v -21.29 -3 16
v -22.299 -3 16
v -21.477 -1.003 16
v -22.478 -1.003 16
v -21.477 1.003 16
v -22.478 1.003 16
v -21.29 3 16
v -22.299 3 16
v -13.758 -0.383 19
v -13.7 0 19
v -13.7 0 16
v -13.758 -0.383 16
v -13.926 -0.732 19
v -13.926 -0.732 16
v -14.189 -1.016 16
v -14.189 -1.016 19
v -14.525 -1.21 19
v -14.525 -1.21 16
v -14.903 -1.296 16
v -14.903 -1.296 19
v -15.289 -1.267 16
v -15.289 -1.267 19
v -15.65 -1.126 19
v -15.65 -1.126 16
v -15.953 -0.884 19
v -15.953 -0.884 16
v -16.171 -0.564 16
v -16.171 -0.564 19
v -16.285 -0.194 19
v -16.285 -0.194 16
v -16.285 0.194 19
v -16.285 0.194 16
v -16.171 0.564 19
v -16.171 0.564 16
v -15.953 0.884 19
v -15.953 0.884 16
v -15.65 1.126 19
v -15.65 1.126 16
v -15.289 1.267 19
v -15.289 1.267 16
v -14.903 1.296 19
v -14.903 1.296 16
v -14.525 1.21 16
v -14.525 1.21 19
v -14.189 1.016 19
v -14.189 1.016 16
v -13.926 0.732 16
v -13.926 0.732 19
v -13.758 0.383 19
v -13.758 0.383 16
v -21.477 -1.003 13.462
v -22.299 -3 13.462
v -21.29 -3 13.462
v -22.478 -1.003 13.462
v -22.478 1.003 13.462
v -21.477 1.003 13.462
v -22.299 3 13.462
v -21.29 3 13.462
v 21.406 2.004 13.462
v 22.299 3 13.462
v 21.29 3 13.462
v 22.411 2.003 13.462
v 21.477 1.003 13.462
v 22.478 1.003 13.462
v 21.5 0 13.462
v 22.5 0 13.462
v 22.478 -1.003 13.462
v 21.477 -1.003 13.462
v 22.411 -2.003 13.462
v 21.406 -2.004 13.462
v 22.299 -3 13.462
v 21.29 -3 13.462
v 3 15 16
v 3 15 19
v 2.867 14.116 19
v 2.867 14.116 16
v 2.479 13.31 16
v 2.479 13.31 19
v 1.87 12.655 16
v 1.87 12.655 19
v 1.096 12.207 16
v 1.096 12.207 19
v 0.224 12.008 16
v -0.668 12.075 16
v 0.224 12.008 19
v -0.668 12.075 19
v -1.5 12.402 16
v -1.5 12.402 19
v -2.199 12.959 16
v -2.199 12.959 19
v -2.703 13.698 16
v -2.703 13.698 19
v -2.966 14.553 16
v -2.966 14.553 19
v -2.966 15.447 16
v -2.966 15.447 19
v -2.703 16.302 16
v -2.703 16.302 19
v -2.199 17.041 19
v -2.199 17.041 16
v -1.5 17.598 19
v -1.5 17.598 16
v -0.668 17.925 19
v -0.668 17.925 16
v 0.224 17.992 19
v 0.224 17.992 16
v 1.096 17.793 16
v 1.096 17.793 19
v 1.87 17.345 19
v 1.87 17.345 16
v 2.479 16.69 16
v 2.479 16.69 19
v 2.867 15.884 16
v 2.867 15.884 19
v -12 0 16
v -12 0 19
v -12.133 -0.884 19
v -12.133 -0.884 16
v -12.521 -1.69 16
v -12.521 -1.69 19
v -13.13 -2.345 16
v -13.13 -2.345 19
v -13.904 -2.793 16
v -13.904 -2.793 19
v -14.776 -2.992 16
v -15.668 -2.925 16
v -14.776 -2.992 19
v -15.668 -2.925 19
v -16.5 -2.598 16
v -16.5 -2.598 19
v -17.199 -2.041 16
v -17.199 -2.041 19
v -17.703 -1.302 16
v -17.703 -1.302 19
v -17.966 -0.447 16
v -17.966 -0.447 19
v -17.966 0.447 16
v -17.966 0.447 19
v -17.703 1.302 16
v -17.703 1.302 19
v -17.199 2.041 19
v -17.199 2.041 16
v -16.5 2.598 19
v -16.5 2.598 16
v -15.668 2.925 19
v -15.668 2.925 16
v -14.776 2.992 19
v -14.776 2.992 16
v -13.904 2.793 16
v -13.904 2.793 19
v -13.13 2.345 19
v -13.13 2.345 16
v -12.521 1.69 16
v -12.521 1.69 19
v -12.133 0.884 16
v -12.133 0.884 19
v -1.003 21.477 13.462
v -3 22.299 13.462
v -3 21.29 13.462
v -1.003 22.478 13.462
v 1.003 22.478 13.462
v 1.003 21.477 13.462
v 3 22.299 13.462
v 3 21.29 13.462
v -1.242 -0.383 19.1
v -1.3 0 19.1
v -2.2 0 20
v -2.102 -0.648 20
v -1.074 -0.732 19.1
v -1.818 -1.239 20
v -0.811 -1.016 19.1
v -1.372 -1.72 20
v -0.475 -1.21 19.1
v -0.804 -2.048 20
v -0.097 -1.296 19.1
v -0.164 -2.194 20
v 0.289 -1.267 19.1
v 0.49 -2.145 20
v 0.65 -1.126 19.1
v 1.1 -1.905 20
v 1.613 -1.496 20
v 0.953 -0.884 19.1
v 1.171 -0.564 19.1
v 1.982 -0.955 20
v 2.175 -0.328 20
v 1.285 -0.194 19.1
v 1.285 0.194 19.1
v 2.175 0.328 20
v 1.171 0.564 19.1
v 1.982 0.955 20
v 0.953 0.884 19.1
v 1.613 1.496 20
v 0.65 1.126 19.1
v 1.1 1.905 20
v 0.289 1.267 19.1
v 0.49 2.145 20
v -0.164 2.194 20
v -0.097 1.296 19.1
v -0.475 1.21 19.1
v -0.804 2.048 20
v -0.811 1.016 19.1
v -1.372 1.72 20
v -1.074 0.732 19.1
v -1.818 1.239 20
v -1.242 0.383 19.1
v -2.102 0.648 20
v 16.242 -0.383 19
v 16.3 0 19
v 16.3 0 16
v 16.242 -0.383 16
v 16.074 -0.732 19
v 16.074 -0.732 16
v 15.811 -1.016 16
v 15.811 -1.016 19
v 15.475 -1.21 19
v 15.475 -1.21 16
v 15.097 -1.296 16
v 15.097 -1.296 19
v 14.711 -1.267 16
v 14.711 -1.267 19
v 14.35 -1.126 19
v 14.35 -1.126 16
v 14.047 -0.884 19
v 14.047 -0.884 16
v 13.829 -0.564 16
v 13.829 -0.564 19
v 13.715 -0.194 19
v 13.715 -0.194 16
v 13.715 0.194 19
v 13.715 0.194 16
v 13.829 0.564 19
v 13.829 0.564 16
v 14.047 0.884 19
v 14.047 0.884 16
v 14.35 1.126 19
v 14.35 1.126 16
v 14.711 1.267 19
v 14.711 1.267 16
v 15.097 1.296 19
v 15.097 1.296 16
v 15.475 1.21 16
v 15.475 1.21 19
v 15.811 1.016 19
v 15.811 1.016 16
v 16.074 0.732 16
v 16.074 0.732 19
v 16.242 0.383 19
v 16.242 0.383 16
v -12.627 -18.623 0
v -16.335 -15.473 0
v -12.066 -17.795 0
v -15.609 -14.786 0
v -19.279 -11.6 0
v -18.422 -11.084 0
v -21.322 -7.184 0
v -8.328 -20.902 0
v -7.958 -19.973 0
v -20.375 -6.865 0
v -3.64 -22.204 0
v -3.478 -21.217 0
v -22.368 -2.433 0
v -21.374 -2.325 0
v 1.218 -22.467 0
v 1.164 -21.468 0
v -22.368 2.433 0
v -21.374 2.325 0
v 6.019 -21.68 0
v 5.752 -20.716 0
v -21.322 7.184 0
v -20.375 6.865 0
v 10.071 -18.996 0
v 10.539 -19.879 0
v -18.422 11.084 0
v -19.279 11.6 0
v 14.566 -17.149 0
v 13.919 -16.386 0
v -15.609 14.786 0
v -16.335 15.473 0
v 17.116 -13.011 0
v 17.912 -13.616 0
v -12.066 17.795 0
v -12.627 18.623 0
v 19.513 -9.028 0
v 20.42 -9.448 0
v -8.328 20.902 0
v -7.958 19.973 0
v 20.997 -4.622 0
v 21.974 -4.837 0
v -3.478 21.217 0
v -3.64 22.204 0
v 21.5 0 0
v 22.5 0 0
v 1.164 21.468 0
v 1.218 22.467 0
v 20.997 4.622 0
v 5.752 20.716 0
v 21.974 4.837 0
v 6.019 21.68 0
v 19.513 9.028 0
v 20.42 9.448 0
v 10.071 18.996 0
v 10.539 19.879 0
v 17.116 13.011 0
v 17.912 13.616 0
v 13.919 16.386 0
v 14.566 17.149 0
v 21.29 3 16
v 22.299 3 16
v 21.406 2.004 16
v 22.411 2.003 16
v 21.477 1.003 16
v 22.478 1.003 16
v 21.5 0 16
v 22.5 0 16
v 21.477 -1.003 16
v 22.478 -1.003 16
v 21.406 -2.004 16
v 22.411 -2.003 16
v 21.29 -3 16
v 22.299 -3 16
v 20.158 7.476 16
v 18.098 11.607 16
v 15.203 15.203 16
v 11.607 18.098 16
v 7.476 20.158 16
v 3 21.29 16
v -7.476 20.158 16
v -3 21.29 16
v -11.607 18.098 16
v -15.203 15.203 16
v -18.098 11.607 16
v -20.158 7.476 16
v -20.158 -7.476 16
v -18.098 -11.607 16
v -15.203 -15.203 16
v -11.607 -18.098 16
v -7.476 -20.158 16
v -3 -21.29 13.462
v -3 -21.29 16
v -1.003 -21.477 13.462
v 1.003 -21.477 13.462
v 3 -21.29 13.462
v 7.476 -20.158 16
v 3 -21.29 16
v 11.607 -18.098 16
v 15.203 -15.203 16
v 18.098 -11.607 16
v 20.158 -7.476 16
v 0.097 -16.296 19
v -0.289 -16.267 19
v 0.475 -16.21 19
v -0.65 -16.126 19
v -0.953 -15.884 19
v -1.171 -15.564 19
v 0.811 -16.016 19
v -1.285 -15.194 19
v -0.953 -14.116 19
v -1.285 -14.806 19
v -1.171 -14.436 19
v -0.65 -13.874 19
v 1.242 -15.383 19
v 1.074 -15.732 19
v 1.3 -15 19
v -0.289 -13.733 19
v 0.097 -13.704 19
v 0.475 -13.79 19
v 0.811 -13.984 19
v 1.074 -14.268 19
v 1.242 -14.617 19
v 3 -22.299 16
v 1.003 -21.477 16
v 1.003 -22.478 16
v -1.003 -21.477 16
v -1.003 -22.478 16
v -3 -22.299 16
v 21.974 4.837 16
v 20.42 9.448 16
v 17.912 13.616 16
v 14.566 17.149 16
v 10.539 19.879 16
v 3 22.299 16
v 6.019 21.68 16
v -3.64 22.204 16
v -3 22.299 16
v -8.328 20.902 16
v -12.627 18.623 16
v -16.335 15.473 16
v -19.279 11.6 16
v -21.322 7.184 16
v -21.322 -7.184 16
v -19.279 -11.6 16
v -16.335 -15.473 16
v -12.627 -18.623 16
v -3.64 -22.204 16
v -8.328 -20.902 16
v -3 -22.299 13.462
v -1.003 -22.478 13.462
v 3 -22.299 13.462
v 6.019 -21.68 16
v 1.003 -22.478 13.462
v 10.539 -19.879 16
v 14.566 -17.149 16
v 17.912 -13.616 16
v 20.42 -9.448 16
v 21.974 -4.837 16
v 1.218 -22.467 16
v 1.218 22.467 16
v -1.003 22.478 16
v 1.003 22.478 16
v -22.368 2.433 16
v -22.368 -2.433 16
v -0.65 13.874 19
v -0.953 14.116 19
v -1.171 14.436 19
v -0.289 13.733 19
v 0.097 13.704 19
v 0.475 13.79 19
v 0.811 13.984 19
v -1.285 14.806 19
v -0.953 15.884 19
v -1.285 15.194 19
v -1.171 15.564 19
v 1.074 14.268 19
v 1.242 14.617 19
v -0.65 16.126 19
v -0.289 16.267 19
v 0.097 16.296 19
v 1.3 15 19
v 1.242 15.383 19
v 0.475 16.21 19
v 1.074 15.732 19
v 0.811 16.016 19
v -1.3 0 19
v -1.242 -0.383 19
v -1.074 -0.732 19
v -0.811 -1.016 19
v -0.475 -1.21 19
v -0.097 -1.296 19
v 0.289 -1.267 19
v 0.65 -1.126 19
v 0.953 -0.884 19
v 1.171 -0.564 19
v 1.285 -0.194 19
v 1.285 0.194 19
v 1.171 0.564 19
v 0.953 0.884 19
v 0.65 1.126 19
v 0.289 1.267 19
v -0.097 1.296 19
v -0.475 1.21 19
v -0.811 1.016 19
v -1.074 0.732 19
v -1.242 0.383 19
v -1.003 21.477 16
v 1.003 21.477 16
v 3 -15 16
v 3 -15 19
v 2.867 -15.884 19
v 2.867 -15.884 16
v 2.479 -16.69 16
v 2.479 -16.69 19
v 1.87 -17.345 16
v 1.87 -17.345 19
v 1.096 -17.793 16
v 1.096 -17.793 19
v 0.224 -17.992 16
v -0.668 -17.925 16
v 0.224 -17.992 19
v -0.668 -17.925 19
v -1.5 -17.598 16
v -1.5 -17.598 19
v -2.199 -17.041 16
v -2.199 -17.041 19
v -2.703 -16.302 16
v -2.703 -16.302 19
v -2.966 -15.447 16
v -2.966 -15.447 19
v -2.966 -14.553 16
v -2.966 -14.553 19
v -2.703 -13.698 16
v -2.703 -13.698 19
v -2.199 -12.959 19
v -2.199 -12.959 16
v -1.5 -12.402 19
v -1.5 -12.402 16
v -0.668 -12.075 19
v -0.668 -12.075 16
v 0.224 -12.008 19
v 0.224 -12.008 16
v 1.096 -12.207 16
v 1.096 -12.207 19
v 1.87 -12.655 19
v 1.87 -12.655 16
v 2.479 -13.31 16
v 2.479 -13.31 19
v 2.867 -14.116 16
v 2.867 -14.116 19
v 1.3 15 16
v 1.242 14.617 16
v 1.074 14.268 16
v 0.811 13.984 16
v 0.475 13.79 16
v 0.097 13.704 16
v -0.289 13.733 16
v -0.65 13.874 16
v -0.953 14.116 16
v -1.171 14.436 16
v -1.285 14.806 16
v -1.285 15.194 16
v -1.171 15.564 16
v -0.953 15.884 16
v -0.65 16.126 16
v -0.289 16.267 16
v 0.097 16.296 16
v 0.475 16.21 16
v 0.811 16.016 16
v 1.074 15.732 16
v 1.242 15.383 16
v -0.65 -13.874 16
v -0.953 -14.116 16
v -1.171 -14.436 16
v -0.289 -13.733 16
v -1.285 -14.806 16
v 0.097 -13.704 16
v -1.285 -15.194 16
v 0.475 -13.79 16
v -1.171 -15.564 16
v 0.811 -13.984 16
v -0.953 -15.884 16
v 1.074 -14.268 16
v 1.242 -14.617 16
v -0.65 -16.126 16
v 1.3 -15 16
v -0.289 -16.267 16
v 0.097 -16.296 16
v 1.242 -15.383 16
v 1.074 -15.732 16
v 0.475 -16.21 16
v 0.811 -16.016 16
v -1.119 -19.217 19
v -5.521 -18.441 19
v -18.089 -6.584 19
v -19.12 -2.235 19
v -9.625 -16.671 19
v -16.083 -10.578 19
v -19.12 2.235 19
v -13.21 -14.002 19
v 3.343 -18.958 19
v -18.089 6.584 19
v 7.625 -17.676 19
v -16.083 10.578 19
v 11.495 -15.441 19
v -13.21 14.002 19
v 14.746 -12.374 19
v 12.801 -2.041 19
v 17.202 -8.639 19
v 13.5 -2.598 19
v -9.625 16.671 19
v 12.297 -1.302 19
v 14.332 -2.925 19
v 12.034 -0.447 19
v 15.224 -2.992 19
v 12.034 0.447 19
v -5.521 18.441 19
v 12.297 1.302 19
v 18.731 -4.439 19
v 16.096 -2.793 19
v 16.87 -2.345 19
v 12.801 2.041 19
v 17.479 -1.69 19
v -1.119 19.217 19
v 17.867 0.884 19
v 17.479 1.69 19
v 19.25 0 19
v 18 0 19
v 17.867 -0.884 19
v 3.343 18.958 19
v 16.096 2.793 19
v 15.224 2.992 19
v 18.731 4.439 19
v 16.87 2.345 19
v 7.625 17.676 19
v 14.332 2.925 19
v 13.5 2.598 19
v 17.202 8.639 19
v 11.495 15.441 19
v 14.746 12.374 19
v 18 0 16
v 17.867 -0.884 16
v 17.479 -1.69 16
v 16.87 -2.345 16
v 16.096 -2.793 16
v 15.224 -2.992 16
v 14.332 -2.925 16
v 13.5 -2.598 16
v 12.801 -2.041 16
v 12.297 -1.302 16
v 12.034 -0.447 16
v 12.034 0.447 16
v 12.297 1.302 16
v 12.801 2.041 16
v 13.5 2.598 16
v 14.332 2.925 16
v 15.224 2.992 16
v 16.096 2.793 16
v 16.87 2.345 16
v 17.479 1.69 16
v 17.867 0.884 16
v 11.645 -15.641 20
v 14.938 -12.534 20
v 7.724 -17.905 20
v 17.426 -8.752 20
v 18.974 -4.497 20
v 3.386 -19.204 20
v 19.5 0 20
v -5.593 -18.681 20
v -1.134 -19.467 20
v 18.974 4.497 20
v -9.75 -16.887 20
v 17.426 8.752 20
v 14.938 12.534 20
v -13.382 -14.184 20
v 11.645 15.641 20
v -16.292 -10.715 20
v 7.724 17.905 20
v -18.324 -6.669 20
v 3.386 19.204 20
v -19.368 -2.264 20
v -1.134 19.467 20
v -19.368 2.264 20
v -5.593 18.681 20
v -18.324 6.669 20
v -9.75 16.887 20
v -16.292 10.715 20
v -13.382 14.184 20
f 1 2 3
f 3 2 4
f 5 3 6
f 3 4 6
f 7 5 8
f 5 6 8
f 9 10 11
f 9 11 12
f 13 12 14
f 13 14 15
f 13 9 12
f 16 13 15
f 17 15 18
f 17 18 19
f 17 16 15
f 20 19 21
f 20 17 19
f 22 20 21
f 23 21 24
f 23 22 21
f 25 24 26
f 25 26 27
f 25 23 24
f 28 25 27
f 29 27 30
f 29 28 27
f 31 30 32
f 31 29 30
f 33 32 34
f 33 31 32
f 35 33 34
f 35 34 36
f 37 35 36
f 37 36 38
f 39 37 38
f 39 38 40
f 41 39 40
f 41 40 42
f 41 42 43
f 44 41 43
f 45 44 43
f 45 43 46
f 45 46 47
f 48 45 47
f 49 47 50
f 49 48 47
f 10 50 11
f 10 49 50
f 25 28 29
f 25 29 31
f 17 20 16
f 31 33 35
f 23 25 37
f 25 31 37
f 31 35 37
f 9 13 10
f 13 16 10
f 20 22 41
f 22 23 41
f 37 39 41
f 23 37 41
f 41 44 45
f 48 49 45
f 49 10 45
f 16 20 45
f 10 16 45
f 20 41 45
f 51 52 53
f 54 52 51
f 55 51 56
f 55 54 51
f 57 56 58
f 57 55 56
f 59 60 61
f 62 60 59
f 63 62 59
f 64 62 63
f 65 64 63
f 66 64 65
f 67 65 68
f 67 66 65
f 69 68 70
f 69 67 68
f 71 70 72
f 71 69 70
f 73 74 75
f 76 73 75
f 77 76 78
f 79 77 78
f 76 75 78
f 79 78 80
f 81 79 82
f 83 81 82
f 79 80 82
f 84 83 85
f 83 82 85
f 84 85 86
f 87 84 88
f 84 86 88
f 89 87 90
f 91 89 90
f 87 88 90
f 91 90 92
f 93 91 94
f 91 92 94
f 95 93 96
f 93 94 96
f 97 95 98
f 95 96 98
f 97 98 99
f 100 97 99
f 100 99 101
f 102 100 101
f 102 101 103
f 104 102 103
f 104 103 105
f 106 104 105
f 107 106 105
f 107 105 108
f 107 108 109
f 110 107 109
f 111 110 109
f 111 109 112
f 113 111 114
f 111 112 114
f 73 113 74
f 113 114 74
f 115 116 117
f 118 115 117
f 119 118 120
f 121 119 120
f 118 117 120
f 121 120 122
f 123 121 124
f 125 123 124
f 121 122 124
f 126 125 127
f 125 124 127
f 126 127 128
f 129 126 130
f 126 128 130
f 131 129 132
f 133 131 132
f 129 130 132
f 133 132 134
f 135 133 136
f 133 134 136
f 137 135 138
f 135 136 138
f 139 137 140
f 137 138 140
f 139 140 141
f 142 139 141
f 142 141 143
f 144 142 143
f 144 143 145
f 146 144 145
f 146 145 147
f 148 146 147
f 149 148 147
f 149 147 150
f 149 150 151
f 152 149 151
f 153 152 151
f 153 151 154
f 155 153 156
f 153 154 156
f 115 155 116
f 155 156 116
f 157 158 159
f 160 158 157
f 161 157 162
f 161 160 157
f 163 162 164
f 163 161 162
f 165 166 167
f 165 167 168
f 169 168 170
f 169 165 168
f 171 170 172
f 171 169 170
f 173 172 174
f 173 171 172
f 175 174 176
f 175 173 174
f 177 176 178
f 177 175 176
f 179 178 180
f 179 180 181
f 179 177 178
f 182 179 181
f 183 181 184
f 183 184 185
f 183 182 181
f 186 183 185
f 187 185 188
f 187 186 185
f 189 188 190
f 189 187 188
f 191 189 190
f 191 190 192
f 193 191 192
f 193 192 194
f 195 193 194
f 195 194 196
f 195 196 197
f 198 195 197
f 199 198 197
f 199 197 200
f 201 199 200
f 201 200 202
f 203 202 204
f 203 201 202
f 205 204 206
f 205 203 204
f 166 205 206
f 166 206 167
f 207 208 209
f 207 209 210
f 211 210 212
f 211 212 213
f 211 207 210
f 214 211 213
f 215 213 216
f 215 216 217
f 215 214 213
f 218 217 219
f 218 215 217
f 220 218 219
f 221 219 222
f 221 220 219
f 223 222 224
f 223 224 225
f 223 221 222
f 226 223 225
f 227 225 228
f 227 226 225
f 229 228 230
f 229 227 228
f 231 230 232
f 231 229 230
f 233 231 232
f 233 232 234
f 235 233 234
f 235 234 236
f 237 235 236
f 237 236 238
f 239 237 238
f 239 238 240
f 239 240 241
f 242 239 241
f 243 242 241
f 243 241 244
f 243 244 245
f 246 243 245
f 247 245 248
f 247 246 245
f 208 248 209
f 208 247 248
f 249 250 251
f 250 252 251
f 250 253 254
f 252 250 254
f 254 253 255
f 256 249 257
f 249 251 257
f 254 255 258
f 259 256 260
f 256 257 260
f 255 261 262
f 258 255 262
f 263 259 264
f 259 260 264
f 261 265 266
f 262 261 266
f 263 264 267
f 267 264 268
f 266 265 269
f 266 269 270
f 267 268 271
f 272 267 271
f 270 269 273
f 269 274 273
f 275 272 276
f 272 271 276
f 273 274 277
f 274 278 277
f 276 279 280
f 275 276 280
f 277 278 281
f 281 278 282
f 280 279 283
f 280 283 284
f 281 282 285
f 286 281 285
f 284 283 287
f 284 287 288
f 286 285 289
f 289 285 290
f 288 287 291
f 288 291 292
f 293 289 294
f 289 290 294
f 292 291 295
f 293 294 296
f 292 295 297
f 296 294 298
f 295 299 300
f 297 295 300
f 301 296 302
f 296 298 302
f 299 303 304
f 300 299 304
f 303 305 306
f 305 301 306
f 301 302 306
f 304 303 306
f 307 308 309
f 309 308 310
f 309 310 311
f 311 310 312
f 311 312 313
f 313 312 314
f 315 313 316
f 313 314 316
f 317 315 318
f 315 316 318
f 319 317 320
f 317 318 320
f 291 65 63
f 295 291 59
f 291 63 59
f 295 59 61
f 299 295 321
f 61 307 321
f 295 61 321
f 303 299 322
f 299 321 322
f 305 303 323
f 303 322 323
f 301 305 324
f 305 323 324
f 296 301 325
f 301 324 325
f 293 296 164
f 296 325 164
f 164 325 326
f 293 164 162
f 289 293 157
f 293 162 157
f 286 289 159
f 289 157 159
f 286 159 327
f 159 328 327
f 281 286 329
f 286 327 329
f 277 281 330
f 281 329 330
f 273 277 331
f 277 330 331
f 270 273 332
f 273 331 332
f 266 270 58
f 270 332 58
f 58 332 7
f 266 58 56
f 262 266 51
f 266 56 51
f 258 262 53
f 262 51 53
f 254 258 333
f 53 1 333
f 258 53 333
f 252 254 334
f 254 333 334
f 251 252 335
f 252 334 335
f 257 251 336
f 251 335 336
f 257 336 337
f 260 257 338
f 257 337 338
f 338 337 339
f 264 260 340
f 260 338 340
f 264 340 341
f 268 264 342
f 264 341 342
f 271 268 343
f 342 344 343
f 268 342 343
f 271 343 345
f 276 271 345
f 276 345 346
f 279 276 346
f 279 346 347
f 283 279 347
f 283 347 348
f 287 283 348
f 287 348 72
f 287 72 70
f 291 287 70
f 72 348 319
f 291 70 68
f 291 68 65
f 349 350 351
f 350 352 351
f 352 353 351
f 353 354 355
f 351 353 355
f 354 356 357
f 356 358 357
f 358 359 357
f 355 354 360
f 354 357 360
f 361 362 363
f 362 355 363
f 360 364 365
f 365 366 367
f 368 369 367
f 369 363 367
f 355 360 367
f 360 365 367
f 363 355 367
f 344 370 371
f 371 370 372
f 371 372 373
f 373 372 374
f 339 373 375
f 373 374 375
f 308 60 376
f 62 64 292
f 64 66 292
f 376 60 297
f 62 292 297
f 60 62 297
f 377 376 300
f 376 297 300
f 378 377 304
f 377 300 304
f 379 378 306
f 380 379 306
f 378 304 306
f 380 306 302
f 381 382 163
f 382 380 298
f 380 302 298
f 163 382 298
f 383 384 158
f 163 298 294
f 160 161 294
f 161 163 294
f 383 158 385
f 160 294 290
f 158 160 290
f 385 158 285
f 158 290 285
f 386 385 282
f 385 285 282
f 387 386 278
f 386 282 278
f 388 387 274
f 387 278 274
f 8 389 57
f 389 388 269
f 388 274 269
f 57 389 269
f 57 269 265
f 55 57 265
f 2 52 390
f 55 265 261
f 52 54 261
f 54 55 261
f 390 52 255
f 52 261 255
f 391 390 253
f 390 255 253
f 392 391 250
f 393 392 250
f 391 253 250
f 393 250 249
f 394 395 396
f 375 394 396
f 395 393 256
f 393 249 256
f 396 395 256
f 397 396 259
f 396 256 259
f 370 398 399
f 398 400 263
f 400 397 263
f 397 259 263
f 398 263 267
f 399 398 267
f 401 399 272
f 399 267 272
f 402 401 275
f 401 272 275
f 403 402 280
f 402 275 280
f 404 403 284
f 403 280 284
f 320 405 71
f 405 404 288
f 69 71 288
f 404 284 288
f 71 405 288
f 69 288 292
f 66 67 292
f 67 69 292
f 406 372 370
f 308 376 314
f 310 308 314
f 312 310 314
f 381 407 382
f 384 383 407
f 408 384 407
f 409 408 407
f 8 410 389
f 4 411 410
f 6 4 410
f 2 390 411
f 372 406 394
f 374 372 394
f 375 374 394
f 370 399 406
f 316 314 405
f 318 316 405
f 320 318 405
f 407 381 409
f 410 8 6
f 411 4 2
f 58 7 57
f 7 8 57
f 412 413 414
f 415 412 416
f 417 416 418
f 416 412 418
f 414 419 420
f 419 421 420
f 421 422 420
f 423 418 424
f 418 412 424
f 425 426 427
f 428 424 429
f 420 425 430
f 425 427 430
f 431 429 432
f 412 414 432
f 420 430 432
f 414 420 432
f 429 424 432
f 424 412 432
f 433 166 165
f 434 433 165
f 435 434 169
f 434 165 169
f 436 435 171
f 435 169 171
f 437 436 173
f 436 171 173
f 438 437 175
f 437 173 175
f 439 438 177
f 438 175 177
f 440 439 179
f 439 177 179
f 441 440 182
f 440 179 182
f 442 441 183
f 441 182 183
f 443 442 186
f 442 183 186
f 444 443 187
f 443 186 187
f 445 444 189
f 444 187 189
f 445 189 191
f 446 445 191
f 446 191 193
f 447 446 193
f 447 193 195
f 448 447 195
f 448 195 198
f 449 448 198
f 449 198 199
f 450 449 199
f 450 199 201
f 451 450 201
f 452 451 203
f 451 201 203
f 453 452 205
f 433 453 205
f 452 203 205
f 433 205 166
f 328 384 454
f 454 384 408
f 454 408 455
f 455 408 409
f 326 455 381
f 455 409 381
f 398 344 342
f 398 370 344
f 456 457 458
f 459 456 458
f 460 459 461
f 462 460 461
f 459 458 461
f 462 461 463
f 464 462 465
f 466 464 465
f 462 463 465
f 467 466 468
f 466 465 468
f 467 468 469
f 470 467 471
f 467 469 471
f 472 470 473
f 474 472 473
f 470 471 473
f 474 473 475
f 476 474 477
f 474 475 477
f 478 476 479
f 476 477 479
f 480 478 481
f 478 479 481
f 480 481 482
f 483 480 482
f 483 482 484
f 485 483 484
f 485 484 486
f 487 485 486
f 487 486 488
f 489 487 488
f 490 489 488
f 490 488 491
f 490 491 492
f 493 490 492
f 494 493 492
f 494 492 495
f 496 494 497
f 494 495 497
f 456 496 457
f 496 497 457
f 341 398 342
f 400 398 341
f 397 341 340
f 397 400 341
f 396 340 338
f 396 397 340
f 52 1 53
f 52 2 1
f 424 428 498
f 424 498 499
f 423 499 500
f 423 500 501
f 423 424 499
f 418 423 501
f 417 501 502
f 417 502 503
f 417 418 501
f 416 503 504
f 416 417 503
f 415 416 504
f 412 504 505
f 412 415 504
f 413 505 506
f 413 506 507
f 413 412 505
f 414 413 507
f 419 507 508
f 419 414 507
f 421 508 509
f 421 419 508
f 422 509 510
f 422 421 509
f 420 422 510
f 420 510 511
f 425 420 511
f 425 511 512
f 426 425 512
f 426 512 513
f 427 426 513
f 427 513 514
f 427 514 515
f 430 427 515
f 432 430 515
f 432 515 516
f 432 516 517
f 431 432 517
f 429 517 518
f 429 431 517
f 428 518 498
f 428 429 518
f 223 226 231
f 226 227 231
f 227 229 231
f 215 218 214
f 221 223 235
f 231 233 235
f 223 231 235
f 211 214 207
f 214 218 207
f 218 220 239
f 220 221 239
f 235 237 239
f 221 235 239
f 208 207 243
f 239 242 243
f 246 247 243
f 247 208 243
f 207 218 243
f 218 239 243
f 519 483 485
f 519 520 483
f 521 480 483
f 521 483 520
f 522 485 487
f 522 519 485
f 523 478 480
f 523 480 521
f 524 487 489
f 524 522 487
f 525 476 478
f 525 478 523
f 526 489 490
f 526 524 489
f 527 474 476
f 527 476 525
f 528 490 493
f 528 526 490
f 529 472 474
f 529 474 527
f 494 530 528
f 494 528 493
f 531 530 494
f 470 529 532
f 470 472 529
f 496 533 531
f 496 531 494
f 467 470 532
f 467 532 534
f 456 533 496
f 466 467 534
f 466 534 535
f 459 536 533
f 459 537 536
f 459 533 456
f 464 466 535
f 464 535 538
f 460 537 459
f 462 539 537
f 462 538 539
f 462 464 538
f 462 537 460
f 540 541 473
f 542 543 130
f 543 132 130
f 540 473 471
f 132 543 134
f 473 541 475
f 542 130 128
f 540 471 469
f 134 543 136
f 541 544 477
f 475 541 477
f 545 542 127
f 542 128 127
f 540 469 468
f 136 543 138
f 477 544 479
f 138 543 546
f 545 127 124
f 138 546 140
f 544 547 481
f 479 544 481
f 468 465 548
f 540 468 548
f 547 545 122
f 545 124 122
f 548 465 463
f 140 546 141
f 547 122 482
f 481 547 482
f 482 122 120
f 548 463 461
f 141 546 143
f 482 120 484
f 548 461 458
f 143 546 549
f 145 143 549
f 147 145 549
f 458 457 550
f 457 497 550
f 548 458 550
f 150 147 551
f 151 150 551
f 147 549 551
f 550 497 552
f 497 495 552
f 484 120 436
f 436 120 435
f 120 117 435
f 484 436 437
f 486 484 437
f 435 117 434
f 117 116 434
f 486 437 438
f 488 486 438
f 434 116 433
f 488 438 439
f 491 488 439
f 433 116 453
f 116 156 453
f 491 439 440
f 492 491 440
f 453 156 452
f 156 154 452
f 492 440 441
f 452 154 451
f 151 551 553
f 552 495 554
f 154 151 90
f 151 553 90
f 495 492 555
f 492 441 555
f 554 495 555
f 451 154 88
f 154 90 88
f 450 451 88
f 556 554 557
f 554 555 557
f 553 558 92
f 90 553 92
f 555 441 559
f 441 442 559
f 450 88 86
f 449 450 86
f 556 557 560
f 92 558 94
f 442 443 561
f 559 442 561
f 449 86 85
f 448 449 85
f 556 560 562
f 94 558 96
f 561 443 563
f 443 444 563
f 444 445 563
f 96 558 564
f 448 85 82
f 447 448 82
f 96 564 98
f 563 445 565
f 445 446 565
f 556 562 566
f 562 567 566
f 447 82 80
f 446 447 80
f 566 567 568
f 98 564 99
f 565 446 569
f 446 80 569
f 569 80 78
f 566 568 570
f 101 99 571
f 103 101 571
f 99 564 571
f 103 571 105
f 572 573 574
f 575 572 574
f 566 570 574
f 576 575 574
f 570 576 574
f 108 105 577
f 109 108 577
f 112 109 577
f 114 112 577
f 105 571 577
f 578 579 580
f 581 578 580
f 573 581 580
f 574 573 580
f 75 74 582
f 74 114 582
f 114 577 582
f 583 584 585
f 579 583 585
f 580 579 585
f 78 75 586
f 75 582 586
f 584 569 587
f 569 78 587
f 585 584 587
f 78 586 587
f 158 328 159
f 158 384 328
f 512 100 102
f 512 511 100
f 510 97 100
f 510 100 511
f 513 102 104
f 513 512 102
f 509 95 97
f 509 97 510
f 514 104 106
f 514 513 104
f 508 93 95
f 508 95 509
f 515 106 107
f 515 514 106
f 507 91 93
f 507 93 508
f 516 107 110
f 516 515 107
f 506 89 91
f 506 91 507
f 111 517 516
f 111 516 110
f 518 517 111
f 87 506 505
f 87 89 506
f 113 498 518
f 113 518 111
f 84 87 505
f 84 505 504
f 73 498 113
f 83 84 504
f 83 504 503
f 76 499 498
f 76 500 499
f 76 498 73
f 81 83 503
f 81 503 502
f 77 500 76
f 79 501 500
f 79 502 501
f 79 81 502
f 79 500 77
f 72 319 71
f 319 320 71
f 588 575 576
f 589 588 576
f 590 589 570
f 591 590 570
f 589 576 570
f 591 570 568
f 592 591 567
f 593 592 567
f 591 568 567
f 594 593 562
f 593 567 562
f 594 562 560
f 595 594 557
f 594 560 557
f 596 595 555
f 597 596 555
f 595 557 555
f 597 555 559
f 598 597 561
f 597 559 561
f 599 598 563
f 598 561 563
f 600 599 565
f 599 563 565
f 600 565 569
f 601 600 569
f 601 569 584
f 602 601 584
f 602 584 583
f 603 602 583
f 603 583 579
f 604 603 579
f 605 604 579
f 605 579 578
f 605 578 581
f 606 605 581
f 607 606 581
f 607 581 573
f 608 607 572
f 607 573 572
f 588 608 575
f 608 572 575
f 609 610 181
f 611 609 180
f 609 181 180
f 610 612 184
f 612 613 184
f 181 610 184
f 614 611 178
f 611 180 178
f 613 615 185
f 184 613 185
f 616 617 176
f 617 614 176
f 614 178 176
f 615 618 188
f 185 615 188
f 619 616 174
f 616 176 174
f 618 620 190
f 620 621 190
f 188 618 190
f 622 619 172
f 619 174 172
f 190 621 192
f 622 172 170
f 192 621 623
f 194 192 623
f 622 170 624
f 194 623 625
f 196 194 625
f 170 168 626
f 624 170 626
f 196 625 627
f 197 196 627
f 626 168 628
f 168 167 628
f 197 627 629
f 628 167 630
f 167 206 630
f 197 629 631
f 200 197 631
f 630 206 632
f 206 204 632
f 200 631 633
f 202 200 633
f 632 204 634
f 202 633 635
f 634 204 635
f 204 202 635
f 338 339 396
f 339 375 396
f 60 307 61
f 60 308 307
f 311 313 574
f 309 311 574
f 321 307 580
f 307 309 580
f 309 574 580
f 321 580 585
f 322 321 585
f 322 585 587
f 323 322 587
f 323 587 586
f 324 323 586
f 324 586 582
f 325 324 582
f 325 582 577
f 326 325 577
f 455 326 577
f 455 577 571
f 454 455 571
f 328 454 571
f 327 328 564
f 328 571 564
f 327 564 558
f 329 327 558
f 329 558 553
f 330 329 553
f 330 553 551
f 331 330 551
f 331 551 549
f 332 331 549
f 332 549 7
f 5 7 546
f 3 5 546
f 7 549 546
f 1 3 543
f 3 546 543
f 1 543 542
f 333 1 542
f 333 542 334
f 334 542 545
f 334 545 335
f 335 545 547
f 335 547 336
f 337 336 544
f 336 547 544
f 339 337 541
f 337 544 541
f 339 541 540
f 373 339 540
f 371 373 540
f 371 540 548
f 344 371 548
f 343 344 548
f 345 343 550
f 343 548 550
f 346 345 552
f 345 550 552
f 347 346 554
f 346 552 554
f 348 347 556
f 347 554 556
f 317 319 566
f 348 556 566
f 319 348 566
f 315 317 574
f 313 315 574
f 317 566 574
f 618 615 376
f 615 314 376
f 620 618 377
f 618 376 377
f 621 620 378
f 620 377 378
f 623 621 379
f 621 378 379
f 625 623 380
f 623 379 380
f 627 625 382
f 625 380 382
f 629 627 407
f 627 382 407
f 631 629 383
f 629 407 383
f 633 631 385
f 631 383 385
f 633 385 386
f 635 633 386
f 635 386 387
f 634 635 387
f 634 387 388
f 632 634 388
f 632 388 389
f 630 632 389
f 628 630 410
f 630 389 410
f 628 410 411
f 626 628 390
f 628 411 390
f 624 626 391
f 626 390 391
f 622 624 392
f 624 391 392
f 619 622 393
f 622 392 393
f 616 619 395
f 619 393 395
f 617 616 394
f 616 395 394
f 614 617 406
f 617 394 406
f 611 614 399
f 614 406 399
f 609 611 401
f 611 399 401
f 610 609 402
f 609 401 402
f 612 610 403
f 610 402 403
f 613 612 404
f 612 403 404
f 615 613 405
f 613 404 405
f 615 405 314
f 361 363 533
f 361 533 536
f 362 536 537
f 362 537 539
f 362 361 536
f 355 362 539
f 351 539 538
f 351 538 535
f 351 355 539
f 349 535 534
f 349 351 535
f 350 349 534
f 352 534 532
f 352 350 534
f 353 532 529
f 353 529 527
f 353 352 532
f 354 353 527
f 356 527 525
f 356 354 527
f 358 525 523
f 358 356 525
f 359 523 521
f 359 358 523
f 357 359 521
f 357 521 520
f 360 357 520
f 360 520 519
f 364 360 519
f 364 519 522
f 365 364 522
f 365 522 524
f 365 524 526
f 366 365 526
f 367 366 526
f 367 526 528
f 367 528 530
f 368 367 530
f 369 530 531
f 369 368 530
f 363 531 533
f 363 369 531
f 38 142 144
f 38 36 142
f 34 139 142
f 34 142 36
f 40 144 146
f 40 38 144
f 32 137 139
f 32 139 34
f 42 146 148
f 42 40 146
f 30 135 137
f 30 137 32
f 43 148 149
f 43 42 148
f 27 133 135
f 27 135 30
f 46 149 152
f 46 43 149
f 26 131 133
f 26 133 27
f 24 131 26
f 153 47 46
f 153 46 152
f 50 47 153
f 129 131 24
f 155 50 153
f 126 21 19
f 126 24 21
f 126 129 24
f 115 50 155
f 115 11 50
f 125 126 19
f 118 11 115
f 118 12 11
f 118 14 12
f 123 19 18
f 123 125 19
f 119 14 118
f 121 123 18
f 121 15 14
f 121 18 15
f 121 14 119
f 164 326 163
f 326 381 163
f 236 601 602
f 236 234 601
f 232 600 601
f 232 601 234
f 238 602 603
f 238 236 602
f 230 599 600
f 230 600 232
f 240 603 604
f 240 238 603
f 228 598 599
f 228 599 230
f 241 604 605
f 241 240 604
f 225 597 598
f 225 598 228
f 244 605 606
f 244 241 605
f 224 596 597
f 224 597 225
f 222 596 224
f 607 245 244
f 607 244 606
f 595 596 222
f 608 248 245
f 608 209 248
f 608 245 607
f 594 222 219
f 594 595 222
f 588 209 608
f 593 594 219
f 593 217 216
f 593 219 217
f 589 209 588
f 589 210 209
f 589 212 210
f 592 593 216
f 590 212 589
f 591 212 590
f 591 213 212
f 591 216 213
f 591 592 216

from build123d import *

# Parameters (mm, degrees)
SKETCH_R           = 1.3
POCKET_DEPTH       = 1
SKETCH002_W        = 6
SKETCH002_H        = 2.537703
POCKET001_DEPTH    = 3
POLARPATTERN_COUNT = 4
SKETCH003_R        = 3
SKETCH003_R_2      = 1.3
PAD_DEPTH          = 3
CHAMFER_SIZE       = 0.9


with BuildPart() as part:
    # Sketch001 → Revolution (revolve)
    with BuildSketch(Plane.XZ):
        Polygon((0, 20), (19.5, 20), (22.5, 16), (22.5, 0), (21.5, 0), (21.5, 15.999988), (19.249991, 19), (0, 19), align=None)
    revolve(axis=Axis((0, 0, 0), (0, 0, 1)))

    # Sketch (on Face1 of Revolution) → Pocket (cut)
    with BuildSketch(Plane(origin=(0, 0, 20), x_dir=(-1, 0, 0), z_dir=(0, 0, 1))):
        Circle(SKETCH_R)
    extrude(amount=-POCKET_DEPTH, mode=Mode.SUBTRACT)

    # Sketch002 (on DatumPlane) → Pocket001 (cut)
    with BuildSketch(Plane(origin=(0, 22.5, 8), x_dir=(1, 0, 0), z_dir=(0, 1, 0))):
        with Locations((0, -6.731148)):
            Rectangle(SKETCH002_W, SKETCH002_H)
    pocket001 = extrude(amount=-POCKET001_DEPTH, mode=Mode.SUBTRACT)

    # PolarPattern: Pocket001 ×4 about axis
    polarpattern_axis = Axis((0, 0, 0), (0, 0, 1))
    for i in range(1, POLARPATTERN_COUNT):
        add(pocket001.rotate(polarpattern_axis, i * 360 / POLARPATTERN_COUNT), mode=Mode.SUBTRACT)

    # Sketch003 (on Face9 of PolarPattern) → Pad (join)
    with BuildSketch(Plane(origin=(0, 0, 19), x_dir=(1, 0, 0), z_dir=(0, 0, -1))):
        with Locations((-15, 0)):
            Circle(SKETCH003_R)
        with Locations((-15, 0)):
            Circle(SKETCH003_R_2, mode=Mode.SUBTRACT)
        with Locations((0, 15)):
            Circle(SKETCH003_R)
        with Locations((0, 15)):
            Circle(SKETCH003_R_2, mode=Mode.SUBTRACT)
        with Locations((15, 0)):
            Circle(SKETCH003_R)
        with Locations((15, 0)):
            Circle(SKETCH003_R_2, mode=Mode.SUBTRACT)
        with Locations((0, -15)):
            Circle(SKETCH003_R)
        with Locations((0, -15)):
            Circle(SKETCH003_R_2, mode=Mode.SUBTRACT)
    extrude(amount=PAD_DEPTH)

    # Chamfer
    chamfer_edges = [part.edges().sort_by_distance(p)[0] for p in [
        (1.3, 0, 20),
    ]]
    chamfer(chamfer_edges, length=CHAMFER_SIZE)


solid = part.part
